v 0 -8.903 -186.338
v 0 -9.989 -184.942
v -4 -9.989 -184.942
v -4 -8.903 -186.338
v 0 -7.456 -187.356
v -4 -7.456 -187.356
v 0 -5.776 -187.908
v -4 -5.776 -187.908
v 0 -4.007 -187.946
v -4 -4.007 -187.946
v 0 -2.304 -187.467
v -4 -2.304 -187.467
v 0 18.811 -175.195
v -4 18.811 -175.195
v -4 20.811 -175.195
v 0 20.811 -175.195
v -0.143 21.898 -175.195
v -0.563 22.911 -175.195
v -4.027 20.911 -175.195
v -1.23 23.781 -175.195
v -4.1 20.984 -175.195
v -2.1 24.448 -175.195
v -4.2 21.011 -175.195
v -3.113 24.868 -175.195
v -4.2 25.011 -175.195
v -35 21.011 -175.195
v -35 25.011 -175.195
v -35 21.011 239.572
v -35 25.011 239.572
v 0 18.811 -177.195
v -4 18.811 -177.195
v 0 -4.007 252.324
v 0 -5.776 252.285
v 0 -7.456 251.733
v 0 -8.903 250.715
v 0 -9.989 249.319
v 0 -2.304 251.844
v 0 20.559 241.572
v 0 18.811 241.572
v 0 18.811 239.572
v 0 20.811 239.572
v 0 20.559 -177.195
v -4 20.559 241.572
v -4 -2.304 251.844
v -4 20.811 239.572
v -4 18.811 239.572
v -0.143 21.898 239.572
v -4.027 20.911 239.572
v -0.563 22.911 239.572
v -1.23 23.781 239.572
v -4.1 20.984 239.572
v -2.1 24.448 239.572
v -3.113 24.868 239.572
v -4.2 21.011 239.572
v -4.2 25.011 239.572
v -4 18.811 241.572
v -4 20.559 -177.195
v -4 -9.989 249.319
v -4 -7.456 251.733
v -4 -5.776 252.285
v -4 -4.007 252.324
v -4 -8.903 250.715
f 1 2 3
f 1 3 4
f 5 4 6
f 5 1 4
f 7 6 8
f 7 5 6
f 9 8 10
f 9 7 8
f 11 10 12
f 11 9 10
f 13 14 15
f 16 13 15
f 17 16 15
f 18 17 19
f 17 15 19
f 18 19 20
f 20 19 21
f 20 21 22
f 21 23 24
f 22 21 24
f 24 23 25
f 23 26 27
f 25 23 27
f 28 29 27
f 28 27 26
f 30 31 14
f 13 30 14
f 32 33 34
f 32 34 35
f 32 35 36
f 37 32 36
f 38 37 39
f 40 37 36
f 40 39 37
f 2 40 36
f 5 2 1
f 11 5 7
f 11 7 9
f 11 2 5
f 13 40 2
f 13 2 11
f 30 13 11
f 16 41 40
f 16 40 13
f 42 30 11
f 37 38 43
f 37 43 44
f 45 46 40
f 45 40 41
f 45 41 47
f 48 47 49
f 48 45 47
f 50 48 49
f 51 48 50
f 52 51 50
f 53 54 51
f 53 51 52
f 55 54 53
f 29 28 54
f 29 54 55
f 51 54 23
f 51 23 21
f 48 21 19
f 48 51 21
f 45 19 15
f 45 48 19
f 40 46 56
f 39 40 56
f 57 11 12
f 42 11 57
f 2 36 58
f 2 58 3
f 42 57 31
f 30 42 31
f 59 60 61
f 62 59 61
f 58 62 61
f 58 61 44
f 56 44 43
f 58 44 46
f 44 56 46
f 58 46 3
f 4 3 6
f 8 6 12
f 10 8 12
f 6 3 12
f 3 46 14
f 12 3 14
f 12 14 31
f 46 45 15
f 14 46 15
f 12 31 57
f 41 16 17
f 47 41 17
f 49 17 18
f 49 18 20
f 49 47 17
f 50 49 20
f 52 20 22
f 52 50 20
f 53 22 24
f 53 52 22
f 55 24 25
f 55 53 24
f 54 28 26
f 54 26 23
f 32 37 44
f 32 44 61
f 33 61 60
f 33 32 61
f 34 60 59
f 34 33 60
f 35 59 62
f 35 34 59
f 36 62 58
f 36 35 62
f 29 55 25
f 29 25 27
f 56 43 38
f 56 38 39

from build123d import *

# Parameters (mm, degrees)
BASE_FLANGE1_DEPTH            = 4
EDGE_FLANGE1_STRIP_W          = 16.4
EDGE_FLANGE1_STRIP_H          = 4
EDGE_FLANGE1_STRIP_CUT_DEPTH  = 414.766345977
EDGE_FLANGE1_RELIEF_W         = 18.4
EDGE_FLANGE1_RELIEF_H         = 2
EDGE_FLANGE1_RELIEF_CUT_DEPTH = 4
EDGE_FLANGE1_DEPTH            = 414.766345977


# Sheet-metal steps are written as plain solids
with BuildPart() as part:
    # Sketch1 → Base-Flange1 (new body)
    with BuildSketch(Plane(origin=(0, 0, 0), x_dir=(0, 0, -1), z_dir=(1, 0, 0))):
        with BuildLine():
            Line((175.194547185, 25.010679354), (-239.571798792, 25.010679354))
            Line((-239.571798792, 25.010679354), (-251.844435082, -2.304137004))
            ThreePointArc((-251.844435082, -2.304137004), (-252.071577805, -6.636355429), (-249.318881936, -9.989320646))
            Line((-249.318881936, -9.989320646), (184.941630328, -9.989320646))
            ThreePointArc((184.941630328, -9.989320646), (187.694326197, -6.636355429), (187.467183475, -2.304137004))
            Line((187.467183475, -2.304137004), (175.194547185, 25.010679354))
        make_face()
    extrude(amount=-BASE_FLANGE1_DEPTH)

    # Edge-Flange1 strip (across the edge) → Edge-Flange1 strip cut (cut)
    with BuildSketch(Plane(origin=(-4, 25.010679354, 239.571798792), x_dir=(0, -1, 0), z_dir=(0, 0, -1))):
        with Locations((-4, -2)):
            Rectangle(EDGE_FLANGE1_STRIP_W, EDGE_FLANGE1_STRIP_H)
    extrude(amount=EDGE_FLANGE1_STRIP_CUT_DEPTH, mode=Mode.SUBTRACT)

    # Edge-Flange1 relief (on the sheet) → Edge-Flange1 relief cut (cut)
    with BuildSketch(Plane(origin=(-4, 20.810679354, 239.571798792), x_dir=(0, -1, 0), z_dir=(-1, 0, 0))):
        with Locations((-7.2, 1)):
            Rectangle(EDGE_FLANGE1_RELIEF_W, EDGE_FLANGE1_RELIEF_H)
        with Locations((-7.2, -415.766345977)):
            Rectangle(EDGE_FLANGE1_RELIEF_W, EDGE_FLANGE1_RELIEF_H)
    extrude(amount=-EDGE_FLANGE1_RELIEF_CUT_DEPTH, mode=Mode.SUBTRACT)

    # Edge-Flange1 section (across the edge) → Edge-Flange1 (add)
    with BuildSketch(Plane(origin=(-4, 25.010679354, 239.571798792), x_dir=(0, -1, 0), z_dir=(0, 0, -1))):
        with BuildLine():
            Line((0, 0.2), (0, 31))
            Line((0, 31), (4, 31))
            Line((4, 31), (4, 0.2))
            ThreePointArc((4, 0.2), (4.058578644, 0.058578644), (4.2, 0))
            Line((4.2, 0), (4.2, -4))
            ThreePointArc((4.2, -4), (1.230151519, -2.769848481), (0, 0.2))
        make_face()
    extrude(amount=EDGE_FLANGE1_DEPTH)


solid = part.part
